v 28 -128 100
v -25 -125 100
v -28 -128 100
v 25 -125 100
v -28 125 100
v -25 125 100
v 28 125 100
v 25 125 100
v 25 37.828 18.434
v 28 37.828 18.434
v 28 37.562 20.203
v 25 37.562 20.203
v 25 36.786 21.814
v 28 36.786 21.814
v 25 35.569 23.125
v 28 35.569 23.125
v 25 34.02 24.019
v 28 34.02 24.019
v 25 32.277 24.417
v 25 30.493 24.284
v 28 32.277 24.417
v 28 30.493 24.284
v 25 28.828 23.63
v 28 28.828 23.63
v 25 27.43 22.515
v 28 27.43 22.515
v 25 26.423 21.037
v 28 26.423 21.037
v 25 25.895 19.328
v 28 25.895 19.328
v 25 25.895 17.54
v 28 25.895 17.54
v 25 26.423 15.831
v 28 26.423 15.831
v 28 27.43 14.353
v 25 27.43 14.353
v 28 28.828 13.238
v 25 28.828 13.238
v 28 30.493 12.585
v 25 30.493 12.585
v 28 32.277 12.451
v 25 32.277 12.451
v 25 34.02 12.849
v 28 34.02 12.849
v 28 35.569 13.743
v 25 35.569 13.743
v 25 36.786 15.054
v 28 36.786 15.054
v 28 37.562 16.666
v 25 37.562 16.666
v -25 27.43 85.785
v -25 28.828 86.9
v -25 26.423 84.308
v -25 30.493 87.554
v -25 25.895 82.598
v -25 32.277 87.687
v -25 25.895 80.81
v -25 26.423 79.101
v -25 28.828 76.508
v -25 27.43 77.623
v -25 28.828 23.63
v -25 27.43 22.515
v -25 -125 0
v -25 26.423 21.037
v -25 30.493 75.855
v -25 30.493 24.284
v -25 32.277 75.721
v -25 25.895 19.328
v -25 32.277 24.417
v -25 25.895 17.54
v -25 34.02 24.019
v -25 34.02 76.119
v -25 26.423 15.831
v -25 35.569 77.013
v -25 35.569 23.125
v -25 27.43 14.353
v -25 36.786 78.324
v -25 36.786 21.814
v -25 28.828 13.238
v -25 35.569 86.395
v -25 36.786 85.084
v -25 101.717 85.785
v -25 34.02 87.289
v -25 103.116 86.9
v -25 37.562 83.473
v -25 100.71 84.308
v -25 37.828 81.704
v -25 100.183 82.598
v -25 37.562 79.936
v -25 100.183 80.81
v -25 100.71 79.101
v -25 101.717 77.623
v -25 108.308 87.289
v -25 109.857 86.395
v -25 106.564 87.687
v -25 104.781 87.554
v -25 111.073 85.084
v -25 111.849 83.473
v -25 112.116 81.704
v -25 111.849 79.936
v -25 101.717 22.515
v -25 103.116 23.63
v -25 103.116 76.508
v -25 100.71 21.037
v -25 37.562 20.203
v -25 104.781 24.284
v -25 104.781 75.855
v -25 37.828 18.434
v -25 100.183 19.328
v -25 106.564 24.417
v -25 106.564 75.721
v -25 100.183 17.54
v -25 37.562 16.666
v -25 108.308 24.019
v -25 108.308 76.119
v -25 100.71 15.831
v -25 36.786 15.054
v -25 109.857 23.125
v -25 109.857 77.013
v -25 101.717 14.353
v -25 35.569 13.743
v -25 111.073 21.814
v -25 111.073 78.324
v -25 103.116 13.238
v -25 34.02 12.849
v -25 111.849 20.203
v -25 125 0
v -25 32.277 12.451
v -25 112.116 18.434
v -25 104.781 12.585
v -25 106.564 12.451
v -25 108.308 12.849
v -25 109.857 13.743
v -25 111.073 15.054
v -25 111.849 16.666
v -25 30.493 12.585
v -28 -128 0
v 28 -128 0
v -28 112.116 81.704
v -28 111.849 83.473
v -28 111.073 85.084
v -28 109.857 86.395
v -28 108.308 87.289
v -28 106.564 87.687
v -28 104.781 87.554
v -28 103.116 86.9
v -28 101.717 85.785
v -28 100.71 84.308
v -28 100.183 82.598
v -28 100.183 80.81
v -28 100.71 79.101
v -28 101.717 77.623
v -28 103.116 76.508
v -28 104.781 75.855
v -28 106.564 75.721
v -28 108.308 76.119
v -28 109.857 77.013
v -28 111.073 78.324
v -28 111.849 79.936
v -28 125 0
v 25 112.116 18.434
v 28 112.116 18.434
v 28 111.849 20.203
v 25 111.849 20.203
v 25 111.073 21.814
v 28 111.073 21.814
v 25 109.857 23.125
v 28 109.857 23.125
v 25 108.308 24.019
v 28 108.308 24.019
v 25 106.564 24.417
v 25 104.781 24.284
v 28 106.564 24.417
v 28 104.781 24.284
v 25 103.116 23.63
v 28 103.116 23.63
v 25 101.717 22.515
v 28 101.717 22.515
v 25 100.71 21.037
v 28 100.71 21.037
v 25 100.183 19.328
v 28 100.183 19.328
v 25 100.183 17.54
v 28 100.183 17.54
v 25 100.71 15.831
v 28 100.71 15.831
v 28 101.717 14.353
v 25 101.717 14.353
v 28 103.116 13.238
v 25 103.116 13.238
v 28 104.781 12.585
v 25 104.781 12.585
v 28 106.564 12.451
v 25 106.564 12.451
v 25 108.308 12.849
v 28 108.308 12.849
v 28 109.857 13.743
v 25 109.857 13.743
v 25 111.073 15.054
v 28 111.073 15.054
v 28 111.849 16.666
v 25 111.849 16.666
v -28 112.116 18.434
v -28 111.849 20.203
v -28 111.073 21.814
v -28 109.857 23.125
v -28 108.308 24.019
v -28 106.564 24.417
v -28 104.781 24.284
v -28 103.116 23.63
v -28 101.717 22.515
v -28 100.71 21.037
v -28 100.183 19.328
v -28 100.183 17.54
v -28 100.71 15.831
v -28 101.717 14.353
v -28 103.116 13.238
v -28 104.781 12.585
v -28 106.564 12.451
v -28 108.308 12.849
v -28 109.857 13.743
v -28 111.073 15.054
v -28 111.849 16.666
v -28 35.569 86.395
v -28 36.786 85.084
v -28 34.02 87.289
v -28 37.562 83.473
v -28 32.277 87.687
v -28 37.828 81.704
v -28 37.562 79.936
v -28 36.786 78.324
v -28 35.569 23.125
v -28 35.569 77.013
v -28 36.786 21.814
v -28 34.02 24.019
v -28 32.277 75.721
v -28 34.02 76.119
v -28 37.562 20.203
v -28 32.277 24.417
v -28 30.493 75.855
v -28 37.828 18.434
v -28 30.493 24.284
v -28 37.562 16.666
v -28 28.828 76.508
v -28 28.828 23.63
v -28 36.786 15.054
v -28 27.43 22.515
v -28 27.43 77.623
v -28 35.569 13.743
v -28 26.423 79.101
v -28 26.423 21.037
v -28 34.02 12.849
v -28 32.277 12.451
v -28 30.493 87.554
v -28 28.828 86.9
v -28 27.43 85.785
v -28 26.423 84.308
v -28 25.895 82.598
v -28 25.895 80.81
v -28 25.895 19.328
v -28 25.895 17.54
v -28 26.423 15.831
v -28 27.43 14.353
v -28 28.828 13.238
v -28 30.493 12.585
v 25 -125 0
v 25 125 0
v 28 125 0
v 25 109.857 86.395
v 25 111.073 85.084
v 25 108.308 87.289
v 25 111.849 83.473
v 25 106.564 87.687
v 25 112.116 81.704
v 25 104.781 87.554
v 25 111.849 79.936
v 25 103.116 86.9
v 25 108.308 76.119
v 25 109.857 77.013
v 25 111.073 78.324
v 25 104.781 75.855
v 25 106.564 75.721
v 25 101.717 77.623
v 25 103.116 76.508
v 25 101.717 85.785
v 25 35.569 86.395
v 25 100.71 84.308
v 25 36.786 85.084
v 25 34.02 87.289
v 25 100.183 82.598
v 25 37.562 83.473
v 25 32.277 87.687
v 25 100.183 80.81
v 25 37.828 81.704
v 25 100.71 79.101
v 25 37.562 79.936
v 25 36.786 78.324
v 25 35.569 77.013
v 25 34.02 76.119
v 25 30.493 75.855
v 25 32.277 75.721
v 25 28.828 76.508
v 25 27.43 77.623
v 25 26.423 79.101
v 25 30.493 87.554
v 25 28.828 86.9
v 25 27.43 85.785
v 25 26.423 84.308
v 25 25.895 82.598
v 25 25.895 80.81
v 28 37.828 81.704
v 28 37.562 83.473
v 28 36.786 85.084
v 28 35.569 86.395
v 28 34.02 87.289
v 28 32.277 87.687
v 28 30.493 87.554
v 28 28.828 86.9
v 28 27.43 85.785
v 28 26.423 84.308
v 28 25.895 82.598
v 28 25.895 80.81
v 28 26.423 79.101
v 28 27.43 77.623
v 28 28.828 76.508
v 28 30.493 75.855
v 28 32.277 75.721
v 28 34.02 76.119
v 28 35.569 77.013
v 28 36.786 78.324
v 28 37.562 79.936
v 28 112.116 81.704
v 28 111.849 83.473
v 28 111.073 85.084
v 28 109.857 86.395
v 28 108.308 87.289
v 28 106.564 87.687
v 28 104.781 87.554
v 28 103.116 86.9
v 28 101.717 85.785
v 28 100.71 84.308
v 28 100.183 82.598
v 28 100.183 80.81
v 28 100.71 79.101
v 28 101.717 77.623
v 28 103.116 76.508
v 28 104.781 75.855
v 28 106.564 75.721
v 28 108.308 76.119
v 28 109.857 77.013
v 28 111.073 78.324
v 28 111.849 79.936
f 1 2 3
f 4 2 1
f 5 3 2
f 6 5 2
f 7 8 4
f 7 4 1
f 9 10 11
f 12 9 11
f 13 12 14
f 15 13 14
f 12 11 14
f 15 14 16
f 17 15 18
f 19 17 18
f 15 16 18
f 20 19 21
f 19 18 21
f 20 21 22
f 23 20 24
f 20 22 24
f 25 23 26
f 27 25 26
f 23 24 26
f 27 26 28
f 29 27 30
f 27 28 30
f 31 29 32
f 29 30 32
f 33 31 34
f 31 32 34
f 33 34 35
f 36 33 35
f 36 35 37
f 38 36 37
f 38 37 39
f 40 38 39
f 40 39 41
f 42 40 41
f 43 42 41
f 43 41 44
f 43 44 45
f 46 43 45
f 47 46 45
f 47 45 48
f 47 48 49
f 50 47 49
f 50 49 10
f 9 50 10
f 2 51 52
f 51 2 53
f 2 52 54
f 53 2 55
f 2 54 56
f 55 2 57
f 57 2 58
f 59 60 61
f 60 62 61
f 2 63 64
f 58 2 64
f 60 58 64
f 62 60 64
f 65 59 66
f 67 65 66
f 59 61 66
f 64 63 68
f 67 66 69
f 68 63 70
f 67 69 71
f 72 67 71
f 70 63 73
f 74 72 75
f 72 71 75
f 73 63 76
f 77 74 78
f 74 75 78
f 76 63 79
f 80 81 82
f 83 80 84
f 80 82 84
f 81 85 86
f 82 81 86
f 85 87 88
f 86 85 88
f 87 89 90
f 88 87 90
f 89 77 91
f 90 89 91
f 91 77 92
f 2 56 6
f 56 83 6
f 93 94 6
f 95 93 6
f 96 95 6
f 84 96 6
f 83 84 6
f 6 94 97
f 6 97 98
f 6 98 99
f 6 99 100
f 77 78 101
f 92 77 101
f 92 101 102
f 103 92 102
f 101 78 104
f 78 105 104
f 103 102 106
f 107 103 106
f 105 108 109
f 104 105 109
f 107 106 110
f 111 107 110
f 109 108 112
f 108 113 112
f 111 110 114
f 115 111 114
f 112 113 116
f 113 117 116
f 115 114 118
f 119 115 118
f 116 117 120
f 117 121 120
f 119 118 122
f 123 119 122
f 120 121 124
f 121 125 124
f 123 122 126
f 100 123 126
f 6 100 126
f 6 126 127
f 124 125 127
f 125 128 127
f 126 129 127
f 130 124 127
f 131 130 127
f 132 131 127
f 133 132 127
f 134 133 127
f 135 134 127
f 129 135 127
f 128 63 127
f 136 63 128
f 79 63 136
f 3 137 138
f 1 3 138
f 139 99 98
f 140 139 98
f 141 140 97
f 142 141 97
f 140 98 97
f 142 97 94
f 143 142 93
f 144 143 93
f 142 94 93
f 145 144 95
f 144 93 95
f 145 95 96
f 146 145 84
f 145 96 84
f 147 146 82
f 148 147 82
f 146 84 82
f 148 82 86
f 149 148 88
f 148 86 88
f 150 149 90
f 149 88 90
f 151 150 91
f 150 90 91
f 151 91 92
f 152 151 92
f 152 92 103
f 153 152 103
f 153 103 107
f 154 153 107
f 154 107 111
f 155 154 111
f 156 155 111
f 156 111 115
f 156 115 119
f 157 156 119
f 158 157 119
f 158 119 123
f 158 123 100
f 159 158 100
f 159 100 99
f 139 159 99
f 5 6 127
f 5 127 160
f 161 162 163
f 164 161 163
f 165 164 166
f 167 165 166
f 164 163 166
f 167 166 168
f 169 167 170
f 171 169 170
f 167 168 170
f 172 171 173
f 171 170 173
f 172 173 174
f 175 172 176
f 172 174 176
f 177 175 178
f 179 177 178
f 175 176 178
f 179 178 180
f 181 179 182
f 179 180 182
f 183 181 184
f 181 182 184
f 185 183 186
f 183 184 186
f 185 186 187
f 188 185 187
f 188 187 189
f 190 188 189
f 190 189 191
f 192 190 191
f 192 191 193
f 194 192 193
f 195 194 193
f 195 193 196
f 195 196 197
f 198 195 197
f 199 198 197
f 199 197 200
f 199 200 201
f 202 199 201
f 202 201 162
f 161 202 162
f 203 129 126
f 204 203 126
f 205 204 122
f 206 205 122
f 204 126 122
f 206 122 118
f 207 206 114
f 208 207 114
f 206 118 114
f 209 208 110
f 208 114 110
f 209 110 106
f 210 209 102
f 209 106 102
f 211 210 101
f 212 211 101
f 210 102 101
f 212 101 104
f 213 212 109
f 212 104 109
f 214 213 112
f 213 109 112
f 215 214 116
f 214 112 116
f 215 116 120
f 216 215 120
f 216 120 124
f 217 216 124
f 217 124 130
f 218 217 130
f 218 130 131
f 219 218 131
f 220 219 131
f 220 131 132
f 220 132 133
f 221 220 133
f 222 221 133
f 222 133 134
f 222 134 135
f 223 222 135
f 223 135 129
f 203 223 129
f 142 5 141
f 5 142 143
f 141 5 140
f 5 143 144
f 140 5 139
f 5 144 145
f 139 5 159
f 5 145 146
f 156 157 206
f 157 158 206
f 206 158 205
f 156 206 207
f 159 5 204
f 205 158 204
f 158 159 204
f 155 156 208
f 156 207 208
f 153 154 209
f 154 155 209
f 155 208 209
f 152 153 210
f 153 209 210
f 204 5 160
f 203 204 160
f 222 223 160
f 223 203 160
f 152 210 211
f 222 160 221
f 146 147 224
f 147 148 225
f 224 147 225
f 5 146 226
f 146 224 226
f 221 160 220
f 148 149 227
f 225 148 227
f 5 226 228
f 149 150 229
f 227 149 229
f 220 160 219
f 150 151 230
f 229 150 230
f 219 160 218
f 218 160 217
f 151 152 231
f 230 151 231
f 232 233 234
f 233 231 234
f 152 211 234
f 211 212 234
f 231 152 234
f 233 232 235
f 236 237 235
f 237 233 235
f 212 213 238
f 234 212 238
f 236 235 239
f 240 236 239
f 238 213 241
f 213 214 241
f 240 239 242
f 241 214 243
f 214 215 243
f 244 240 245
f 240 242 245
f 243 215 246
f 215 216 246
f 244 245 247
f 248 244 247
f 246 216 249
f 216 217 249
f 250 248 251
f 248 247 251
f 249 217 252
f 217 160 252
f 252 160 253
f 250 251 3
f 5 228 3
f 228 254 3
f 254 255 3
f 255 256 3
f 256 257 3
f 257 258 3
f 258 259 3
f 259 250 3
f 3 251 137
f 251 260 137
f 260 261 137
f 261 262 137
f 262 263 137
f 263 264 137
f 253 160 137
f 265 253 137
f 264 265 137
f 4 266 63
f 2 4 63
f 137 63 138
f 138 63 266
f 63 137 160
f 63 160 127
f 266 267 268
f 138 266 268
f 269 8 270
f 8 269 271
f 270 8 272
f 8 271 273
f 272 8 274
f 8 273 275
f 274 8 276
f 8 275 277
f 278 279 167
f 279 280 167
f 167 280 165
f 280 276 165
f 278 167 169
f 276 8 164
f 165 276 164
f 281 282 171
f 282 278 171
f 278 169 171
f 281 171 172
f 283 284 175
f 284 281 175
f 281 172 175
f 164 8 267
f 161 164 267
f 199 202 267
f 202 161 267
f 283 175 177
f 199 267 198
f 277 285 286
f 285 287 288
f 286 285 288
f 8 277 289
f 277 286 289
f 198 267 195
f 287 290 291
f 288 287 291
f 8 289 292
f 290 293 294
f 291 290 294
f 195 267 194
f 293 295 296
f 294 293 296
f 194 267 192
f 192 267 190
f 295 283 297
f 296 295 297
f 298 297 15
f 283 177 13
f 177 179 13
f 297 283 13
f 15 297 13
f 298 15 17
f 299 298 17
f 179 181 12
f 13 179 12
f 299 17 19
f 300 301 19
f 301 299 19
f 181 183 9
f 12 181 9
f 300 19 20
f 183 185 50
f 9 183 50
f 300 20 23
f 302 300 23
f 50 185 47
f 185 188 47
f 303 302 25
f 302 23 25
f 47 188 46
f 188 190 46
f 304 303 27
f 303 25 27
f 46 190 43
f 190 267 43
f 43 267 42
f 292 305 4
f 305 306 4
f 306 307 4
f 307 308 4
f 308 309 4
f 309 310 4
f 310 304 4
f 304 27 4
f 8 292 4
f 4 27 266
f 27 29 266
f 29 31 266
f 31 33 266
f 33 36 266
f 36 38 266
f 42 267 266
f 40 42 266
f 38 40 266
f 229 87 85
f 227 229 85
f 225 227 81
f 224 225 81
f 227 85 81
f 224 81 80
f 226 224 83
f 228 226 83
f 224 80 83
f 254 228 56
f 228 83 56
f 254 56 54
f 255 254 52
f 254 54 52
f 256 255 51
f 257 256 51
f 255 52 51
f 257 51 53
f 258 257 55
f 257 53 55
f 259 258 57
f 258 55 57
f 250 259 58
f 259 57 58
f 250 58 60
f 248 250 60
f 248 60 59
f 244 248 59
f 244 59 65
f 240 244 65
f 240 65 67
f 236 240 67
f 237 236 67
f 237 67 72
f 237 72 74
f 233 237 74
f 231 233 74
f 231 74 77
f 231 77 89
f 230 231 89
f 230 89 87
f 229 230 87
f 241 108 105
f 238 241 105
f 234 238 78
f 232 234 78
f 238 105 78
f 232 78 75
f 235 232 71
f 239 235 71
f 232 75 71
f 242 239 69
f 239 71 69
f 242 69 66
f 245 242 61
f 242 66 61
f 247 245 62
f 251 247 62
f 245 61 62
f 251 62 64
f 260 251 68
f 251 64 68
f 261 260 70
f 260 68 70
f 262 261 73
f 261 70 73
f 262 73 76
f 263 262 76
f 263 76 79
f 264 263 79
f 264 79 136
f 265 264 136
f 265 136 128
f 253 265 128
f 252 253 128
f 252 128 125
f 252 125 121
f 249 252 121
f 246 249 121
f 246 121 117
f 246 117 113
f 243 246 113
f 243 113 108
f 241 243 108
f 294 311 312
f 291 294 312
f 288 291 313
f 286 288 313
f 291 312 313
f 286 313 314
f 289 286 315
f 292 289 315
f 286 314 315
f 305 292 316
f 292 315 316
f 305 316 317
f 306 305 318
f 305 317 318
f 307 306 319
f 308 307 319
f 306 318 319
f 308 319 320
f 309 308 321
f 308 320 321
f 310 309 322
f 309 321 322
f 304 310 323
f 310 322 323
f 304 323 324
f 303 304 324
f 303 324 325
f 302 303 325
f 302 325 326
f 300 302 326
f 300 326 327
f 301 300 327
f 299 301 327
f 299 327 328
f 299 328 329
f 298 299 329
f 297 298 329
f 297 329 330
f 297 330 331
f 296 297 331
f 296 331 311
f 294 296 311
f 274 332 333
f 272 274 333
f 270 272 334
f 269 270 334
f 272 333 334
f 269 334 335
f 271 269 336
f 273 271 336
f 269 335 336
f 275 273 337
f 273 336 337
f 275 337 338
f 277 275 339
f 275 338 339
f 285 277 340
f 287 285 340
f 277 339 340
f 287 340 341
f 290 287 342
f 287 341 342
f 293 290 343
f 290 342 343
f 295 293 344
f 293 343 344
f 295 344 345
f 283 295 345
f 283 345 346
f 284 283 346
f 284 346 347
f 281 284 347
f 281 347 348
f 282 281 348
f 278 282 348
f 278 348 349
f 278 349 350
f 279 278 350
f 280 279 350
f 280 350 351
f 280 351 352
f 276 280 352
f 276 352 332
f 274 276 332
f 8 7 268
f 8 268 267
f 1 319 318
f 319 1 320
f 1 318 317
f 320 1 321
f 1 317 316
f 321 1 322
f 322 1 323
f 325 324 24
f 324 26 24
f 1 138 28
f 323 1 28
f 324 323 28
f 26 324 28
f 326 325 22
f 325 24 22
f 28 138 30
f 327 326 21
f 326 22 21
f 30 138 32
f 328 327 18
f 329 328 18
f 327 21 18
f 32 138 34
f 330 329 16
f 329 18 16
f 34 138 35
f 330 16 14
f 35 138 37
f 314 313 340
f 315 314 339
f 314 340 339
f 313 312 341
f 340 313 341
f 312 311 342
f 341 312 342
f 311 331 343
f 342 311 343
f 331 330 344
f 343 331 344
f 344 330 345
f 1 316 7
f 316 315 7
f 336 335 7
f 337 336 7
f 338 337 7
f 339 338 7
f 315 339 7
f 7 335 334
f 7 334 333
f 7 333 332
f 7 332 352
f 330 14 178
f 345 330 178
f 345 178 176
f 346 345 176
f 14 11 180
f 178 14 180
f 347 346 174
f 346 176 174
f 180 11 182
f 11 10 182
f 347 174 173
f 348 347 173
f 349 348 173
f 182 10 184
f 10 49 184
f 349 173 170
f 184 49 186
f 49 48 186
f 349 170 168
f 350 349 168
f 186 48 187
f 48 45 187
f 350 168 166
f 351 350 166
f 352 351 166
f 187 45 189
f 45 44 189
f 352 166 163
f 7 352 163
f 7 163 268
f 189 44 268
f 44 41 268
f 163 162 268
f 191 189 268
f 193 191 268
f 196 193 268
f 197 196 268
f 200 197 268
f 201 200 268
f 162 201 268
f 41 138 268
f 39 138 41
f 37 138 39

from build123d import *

# Parameters (mm, degrees)
SALIENTE_EXTRUIR1_DEPTH = 100
CROQUIS2_R              = 6
CORTAR_EXTRUIR1_DEPTH   = 172.813852759


with BuildPart() as part:
    # Croquis1 → Saliente-Extruir1 (new body)
    with BuildSketch(Plane.XY):
        Polygon((-28, 125), (-28, -128), (28, -128), (28, 125), (25, 125), (25, -125), (-25, -125), (-25, 125), align=None)
    extrude(amount=SALIENTE_EXTRUIR1_DEPTH)

    # Croquis2 → Cortar-Extruir1 (cut, through all)
    with BuildSketch(Plane(origin=(28, 0, 0), x_dir=(0, 0, -1), z_dir=(1, 0, 0))):
        with Locations(Location((-81.704212475, 106.115669713, 0), (0, 0, 90))):
            Circle(CROQUIS2_R)
        with Locations(Location((-18.434102118, 106.115669713, 0), (0, 0, 90))):
            Circle(CROQUIS2_R)
        with Locations(Location((-18.434102118, 31.828375961, 0), (0, 0, 90))):
            Circle(CROQUIS2_R)
        with Locations(Location((-81.704212475, 31.828375961, 0), (0, 0, 90))):
            Circle(CROQUIS2_R)
    extrude(amount=-CORTAR_EXTRUIR1_DEPTH, mode=Mode.SUBTRACT)


solid = part.part
